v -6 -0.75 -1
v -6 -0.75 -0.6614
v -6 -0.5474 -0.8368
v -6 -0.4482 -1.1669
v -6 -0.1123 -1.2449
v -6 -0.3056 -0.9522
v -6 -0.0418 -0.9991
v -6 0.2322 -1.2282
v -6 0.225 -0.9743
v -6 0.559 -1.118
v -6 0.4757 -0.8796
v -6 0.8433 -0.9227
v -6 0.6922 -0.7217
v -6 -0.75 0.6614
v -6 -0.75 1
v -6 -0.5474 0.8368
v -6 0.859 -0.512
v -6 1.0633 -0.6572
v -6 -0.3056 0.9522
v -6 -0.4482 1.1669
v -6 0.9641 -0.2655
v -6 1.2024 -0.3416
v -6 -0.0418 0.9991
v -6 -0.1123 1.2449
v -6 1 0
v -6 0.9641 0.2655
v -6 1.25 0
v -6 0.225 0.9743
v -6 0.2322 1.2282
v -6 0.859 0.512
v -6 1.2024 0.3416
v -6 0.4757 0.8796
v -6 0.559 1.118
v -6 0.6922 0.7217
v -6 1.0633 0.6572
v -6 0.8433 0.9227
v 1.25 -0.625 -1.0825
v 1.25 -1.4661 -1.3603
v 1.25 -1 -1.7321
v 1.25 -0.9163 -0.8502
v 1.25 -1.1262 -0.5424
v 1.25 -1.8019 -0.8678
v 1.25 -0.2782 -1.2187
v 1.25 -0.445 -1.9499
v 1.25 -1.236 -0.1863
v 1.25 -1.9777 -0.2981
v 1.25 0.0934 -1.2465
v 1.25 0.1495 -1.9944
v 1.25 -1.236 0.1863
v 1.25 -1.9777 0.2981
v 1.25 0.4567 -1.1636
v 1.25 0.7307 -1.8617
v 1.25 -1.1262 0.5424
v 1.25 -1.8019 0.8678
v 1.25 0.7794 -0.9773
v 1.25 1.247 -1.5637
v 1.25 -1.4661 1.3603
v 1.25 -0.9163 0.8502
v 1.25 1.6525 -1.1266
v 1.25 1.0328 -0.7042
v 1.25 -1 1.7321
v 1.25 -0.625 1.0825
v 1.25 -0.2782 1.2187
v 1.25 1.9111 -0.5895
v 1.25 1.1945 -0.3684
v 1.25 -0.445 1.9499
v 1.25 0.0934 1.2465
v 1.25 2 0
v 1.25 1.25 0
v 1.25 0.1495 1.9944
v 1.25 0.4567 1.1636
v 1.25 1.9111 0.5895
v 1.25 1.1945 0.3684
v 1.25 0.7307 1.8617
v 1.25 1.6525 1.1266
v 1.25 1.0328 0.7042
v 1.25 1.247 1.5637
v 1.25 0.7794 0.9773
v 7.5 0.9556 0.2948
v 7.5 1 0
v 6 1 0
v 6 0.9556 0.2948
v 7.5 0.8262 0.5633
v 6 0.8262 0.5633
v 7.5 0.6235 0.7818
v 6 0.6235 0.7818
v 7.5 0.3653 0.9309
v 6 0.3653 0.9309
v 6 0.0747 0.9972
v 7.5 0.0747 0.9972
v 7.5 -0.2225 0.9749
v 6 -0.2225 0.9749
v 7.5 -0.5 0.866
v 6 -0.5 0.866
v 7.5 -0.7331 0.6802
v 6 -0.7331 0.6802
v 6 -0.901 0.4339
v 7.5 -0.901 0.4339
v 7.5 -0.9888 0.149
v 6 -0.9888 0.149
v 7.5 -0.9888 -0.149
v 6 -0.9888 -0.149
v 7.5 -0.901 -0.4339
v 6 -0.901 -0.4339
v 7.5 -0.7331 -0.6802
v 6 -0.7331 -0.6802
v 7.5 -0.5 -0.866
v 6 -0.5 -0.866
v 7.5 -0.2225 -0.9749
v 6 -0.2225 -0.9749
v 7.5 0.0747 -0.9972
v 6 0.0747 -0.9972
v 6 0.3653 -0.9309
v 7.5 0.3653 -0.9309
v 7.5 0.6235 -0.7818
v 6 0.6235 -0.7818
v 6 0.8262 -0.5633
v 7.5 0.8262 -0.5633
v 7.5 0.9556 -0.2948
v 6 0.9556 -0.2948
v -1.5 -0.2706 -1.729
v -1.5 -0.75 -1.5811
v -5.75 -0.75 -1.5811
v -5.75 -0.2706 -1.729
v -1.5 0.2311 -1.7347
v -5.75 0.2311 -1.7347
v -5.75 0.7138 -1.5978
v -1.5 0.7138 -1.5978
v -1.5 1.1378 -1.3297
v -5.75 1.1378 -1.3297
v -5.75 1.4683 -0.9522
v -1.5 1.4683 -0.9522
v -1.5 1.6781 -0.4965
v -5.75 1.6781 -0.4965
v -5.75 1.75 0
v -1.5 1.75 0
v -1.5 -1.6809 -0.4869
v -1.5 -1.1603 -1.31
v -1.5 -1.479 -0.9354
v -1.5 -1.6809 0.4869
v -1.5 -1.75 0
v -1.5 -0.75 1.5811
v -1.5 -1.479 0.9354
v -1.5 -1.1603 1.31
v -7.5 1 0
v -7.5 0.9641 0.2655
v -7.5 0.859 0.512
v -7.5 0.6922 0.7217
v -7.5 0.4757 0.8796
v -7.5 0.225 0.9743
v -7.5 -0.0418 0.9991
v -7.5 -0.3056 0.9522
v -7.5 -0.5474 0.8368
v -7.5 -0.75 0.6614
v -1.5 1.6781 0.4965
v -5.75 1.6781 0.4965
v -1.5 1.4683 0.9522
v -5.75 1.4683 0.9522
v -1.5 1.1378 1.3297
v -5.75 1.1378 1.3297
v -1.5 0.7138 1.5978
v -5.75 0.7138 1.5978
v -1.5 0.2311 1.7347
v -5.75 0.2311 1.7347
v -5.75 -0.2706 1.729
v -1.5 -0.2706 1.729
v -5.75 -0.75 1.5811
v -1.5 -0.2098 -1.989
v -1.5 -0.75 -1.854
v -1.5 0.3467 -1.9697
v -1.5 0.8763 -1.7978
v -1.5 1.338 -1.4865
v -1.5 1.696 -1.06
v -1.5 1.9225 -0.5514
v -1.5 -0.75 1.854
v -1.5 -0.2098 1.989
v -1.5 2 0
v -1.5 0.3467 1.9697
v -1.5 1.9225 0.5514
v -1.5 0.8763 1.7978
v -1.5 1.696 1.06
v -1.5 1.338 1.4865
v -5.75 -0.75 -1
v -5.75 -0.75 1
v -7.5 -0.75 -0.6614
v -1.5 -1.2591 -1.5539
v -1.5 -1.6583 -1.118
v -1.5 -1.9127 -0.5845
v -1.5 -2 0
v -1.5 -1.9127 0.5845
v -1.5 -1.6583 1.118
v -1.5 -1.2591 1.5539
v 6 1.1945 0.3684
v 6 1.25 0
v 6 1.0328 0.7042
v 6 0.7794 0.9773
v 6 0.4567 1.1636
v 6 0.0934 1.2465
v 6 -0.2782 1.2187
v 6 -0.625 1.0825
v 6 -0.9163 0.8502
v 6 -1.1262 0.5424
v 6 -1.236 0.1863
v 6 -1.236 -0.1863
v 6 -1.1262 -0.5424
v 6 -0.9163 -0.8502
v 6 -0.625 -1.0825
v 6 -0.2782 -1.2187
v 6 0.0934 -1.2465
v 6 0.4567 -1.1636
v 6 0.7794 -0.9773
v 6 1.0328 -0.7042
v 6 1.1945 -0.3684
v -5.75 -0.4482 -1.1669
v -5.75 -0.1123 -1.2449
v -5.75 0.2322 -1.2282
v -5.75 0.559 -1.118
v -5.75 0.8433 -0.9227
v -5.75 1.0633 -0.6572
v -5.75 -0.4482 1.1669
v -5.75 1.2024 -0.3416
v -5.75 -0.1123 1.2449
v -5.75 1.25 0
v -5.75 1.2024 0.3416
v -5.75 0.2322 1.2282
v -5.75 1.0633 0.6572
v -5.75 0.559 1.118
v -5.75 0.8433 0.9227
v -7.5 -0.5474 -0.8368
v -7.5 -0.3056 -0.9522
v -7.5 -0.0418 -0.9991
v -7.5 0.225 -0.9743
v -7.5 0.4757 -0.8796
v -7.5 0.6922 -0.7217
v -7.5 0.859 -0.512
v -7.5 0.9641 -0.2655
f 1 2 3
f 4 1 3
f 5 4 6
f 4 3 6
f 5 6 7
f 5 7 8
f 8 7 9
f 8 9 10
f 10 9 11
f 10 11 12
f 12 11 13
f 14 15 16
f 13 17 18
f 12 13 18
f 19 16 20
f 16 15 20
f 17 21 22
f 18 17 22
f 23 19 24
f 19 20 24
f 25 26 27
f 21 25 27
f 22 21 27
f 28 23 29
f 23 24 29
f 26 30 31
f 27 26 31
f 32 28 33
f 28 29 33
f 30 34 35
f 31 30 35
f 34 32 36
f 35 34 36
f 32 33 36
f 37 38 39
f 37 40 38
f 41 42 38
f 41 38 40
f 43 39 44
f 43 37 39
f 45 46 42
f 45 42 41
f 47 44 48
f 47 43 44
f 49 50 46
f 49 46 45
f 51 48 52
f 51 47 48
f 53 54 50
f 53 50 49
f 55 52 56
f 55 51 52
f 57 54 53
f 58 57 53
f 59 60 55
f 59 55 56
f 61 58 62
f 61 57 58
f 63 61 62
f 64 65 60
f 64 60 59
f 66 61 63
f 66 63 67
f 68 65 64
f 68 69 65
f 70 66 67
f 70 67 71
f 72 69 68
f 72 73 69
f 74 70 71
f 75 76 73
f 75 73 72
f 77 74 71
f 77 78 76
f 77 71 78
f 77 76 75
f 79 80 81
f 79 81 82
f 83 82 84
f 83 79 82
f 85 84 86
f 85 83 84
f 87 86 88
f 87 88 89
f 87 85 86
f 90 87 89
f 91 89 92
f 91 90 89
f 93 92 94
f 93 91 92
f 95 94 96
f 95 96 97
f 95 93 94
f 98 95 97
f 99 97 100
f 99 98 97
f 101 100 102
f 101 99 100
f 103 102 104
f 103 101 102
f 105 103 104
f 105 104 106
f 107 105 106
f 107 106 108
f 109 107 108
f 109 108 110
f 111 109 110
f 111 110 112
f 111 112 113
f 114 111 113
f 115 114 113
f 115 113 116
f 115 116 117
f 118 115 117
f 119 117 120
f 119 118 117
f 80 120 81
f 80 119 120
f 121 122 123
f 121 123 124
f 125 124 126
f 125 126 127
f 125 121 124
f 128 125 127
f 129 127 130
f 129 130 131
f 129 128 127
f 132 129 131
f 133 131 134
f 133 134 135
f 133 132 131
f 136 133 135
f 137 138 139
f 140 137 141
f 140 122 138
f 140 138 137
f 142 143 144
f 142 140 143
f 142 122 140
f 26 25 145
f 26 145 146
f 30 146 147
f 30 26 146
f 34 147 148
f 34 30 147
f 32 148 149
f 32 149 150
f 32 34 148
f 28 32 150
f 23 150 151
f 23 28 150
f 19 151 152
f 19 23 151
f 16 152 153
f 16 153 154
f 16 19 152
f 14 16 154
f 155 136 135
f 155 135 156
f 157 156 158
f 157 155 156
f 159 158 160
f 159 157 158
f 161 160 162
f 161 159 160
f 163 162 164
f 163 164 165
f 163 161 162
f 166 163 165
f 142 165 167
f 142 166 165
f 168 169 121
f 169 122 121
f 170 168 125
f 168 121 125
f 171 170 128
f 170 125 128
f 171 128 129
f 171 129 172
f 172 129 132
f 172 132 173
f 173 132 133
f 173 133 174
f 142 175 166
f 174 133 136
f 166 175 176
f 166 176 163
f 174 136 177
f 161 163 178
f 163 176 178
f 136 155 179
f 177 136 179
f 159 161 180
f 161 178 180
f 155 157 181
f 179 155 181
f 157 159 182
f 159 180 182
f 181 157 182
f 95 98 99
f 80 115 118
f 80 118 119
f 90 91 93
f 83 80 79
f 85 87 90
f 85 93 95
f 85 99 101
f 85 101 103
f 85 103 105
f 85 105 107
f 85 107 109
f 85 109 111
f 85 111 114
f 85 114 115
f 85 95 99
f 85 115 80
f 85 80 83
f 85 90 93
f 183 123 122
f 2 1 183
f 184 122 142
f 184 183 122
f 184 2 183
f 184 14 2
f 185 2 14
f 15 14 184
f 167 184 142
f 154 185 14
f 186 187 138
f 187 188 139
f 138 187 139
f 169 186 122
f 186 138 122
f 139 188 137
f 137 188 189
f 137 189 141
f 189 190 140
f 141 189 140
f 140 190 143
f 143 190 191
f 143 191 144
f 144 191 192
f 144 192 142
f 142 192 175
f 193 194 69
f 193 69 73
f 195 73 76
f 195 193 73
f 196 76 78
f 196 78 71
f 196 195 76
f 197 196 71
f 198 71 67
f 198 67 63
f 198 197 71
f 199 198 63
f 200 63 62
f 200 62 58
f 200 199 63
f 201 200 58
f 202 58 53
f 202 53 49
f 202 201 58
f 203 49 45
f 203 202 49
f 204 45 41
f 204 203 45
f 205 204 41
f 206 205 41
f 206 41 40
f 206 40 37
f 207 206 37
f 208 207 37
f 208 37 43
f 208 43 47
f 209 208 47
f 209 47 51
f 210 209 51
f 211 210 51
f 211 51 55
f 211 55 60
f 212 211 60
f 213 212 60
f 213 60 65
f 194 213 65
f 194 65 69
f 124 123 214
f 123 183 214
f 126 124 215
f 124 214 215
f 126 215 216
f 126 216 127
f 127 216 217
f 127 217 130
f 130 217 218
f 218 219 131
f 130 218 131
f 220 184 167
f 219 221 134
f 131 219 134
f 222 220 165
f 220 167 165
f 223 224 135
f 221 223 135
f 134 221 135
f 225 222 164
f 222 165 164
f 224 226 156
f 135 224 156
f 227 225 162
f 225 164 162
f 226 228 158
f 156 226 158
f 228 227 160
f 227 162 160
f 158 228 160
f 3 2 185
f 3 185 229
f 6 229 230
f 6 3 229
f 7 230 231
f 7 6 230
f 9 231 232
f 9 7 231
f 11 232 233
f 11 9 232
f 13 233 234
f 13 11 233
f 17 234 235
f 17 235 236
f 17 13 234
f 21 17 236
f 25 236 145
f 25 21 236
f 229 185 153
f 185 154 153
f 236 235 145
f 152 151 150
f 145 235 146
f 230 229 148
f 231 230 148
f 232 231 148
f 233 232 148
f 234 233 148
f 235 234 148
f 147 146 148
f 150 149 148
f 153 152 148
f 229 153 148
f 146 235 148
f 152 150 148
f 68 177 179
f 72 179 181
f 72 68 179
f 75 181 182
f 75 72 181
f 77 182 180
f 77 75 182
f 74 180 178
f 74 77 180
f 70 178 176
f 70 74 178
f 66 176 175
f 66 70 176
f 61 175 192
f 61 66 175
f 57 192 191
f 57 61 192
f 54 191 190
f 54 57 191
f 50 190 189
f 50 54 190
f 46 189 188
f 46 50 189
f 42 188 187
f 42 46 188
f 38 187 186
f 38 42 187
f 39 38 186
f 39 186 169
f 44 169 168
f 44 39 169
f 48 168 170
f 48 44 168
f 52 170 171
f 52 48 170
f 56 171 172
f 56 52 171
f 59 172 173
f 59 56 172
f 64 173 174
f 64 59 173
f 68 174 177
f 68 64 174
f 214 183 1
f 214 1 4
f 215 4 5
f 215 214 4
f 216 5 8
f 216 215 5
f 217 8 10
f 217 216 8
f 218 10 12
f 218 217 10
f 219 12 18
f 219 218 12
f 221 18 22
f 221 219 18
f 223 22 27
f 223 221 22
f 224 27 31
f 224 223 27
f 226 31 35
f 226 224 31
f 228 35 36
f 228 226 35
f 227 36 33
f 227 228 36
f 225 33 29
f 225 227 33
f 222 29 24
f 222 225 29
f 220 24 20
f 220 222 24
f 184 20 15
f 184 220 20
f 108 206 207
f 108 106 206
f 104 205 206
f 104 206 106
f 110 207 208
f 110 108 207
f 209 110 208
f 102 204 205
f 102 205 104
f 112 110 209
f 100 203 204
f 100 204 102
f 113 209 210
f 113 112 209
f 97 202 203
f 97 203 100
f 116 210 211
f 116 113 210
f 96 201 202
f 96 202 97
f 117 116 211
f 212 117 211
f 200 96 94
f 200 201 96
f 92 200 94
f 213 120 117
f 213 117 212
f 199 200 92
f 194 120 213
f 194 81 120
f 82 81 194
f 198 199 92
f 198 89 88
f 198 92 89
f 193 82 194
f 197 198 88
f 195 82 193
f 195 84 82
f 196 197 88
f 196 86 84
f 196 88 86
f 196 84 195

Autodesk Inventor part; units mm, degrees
ref_plane "YZ Plane" through (0, 0, 0) normal (1, 0, 0) x (0, 1, 0)
ref_plane "XZ Plane" through (0, 0, 0) normal (0, 1, 0) x (-1, 0, 0)
ref_plane "XY Plane" through (0, 0, 0) normal (0, 0, 1) x (1, 0, 0)
sketch "Sketch1" plane through (0, 0, 0) normal (0, 0, 1) x (1, 0, 0)
  line L0 (-7.5, 0) -> (7.5, 0)
  line L1 (-7.5, 0) -> (-7.5, 1)
  line L2 (-7.5, 1) -> (-6, 1)
  line L3 (-6, 1) -> (-6, 1.25)
  line L4 (-6, 1.25) -> (-5.75, 1.25)
  line L5 (-5.75, 1.25) -> (-5.75, 1.75)
  line L6 (1.25, 1.25) -> (6, 1.25)
  line L7 (6, 1.25) -> (6, 1)
  line L8 (6, 1) -> (7.5, 1)
  line L9 (7.5, 1) -> (7.5, 0)
  line L10 (0, 0) -> (0, -6.3915) construction
  line L11 (-5.75, 1.75) -> (-1.5, 1.75)
  line L12 (-1.5, 1.75) -> (-1.5, 2)
  line L13 (-1.5, 2) -> (1.25, 2)
  line L14 (1.25, 2) -> (1.25, 1.25)
  dimension "d0" = 15
  dimension "d1" = 1.5
  dimension "d2" = 2
  dimension "d3" = 2.5
  dimension "d8" = 0.25
  dimension "d9" = 3.5
  dimension "d10" = 4
  dimension "d11" = 4.25
  dimension "d12" = 6.25
revolve "Revolution1" add sketch "Sketch1" angle 360 about axis through (-7.5, 0, 0) along (1, 0, 0)
sketch "Sketch2" plane through (-7.5, 0, 0) normal (-1, 0, 0) x (0, 0, 1)
  circle A0 centre (0, 0) radius 2 projected
  line L0 (-1.854, -0.75) -> (1.854, -0.75)
  point P0 (0, 0)
  dimension "d13" = 0.75
extrude "Extrusion1" cut sketch "Sketch2" against normal up to surface (6 mm away) contours L0 A0 picked at (0, -1.1667)
properties part number "IP axle" material "Stainless Steel"
